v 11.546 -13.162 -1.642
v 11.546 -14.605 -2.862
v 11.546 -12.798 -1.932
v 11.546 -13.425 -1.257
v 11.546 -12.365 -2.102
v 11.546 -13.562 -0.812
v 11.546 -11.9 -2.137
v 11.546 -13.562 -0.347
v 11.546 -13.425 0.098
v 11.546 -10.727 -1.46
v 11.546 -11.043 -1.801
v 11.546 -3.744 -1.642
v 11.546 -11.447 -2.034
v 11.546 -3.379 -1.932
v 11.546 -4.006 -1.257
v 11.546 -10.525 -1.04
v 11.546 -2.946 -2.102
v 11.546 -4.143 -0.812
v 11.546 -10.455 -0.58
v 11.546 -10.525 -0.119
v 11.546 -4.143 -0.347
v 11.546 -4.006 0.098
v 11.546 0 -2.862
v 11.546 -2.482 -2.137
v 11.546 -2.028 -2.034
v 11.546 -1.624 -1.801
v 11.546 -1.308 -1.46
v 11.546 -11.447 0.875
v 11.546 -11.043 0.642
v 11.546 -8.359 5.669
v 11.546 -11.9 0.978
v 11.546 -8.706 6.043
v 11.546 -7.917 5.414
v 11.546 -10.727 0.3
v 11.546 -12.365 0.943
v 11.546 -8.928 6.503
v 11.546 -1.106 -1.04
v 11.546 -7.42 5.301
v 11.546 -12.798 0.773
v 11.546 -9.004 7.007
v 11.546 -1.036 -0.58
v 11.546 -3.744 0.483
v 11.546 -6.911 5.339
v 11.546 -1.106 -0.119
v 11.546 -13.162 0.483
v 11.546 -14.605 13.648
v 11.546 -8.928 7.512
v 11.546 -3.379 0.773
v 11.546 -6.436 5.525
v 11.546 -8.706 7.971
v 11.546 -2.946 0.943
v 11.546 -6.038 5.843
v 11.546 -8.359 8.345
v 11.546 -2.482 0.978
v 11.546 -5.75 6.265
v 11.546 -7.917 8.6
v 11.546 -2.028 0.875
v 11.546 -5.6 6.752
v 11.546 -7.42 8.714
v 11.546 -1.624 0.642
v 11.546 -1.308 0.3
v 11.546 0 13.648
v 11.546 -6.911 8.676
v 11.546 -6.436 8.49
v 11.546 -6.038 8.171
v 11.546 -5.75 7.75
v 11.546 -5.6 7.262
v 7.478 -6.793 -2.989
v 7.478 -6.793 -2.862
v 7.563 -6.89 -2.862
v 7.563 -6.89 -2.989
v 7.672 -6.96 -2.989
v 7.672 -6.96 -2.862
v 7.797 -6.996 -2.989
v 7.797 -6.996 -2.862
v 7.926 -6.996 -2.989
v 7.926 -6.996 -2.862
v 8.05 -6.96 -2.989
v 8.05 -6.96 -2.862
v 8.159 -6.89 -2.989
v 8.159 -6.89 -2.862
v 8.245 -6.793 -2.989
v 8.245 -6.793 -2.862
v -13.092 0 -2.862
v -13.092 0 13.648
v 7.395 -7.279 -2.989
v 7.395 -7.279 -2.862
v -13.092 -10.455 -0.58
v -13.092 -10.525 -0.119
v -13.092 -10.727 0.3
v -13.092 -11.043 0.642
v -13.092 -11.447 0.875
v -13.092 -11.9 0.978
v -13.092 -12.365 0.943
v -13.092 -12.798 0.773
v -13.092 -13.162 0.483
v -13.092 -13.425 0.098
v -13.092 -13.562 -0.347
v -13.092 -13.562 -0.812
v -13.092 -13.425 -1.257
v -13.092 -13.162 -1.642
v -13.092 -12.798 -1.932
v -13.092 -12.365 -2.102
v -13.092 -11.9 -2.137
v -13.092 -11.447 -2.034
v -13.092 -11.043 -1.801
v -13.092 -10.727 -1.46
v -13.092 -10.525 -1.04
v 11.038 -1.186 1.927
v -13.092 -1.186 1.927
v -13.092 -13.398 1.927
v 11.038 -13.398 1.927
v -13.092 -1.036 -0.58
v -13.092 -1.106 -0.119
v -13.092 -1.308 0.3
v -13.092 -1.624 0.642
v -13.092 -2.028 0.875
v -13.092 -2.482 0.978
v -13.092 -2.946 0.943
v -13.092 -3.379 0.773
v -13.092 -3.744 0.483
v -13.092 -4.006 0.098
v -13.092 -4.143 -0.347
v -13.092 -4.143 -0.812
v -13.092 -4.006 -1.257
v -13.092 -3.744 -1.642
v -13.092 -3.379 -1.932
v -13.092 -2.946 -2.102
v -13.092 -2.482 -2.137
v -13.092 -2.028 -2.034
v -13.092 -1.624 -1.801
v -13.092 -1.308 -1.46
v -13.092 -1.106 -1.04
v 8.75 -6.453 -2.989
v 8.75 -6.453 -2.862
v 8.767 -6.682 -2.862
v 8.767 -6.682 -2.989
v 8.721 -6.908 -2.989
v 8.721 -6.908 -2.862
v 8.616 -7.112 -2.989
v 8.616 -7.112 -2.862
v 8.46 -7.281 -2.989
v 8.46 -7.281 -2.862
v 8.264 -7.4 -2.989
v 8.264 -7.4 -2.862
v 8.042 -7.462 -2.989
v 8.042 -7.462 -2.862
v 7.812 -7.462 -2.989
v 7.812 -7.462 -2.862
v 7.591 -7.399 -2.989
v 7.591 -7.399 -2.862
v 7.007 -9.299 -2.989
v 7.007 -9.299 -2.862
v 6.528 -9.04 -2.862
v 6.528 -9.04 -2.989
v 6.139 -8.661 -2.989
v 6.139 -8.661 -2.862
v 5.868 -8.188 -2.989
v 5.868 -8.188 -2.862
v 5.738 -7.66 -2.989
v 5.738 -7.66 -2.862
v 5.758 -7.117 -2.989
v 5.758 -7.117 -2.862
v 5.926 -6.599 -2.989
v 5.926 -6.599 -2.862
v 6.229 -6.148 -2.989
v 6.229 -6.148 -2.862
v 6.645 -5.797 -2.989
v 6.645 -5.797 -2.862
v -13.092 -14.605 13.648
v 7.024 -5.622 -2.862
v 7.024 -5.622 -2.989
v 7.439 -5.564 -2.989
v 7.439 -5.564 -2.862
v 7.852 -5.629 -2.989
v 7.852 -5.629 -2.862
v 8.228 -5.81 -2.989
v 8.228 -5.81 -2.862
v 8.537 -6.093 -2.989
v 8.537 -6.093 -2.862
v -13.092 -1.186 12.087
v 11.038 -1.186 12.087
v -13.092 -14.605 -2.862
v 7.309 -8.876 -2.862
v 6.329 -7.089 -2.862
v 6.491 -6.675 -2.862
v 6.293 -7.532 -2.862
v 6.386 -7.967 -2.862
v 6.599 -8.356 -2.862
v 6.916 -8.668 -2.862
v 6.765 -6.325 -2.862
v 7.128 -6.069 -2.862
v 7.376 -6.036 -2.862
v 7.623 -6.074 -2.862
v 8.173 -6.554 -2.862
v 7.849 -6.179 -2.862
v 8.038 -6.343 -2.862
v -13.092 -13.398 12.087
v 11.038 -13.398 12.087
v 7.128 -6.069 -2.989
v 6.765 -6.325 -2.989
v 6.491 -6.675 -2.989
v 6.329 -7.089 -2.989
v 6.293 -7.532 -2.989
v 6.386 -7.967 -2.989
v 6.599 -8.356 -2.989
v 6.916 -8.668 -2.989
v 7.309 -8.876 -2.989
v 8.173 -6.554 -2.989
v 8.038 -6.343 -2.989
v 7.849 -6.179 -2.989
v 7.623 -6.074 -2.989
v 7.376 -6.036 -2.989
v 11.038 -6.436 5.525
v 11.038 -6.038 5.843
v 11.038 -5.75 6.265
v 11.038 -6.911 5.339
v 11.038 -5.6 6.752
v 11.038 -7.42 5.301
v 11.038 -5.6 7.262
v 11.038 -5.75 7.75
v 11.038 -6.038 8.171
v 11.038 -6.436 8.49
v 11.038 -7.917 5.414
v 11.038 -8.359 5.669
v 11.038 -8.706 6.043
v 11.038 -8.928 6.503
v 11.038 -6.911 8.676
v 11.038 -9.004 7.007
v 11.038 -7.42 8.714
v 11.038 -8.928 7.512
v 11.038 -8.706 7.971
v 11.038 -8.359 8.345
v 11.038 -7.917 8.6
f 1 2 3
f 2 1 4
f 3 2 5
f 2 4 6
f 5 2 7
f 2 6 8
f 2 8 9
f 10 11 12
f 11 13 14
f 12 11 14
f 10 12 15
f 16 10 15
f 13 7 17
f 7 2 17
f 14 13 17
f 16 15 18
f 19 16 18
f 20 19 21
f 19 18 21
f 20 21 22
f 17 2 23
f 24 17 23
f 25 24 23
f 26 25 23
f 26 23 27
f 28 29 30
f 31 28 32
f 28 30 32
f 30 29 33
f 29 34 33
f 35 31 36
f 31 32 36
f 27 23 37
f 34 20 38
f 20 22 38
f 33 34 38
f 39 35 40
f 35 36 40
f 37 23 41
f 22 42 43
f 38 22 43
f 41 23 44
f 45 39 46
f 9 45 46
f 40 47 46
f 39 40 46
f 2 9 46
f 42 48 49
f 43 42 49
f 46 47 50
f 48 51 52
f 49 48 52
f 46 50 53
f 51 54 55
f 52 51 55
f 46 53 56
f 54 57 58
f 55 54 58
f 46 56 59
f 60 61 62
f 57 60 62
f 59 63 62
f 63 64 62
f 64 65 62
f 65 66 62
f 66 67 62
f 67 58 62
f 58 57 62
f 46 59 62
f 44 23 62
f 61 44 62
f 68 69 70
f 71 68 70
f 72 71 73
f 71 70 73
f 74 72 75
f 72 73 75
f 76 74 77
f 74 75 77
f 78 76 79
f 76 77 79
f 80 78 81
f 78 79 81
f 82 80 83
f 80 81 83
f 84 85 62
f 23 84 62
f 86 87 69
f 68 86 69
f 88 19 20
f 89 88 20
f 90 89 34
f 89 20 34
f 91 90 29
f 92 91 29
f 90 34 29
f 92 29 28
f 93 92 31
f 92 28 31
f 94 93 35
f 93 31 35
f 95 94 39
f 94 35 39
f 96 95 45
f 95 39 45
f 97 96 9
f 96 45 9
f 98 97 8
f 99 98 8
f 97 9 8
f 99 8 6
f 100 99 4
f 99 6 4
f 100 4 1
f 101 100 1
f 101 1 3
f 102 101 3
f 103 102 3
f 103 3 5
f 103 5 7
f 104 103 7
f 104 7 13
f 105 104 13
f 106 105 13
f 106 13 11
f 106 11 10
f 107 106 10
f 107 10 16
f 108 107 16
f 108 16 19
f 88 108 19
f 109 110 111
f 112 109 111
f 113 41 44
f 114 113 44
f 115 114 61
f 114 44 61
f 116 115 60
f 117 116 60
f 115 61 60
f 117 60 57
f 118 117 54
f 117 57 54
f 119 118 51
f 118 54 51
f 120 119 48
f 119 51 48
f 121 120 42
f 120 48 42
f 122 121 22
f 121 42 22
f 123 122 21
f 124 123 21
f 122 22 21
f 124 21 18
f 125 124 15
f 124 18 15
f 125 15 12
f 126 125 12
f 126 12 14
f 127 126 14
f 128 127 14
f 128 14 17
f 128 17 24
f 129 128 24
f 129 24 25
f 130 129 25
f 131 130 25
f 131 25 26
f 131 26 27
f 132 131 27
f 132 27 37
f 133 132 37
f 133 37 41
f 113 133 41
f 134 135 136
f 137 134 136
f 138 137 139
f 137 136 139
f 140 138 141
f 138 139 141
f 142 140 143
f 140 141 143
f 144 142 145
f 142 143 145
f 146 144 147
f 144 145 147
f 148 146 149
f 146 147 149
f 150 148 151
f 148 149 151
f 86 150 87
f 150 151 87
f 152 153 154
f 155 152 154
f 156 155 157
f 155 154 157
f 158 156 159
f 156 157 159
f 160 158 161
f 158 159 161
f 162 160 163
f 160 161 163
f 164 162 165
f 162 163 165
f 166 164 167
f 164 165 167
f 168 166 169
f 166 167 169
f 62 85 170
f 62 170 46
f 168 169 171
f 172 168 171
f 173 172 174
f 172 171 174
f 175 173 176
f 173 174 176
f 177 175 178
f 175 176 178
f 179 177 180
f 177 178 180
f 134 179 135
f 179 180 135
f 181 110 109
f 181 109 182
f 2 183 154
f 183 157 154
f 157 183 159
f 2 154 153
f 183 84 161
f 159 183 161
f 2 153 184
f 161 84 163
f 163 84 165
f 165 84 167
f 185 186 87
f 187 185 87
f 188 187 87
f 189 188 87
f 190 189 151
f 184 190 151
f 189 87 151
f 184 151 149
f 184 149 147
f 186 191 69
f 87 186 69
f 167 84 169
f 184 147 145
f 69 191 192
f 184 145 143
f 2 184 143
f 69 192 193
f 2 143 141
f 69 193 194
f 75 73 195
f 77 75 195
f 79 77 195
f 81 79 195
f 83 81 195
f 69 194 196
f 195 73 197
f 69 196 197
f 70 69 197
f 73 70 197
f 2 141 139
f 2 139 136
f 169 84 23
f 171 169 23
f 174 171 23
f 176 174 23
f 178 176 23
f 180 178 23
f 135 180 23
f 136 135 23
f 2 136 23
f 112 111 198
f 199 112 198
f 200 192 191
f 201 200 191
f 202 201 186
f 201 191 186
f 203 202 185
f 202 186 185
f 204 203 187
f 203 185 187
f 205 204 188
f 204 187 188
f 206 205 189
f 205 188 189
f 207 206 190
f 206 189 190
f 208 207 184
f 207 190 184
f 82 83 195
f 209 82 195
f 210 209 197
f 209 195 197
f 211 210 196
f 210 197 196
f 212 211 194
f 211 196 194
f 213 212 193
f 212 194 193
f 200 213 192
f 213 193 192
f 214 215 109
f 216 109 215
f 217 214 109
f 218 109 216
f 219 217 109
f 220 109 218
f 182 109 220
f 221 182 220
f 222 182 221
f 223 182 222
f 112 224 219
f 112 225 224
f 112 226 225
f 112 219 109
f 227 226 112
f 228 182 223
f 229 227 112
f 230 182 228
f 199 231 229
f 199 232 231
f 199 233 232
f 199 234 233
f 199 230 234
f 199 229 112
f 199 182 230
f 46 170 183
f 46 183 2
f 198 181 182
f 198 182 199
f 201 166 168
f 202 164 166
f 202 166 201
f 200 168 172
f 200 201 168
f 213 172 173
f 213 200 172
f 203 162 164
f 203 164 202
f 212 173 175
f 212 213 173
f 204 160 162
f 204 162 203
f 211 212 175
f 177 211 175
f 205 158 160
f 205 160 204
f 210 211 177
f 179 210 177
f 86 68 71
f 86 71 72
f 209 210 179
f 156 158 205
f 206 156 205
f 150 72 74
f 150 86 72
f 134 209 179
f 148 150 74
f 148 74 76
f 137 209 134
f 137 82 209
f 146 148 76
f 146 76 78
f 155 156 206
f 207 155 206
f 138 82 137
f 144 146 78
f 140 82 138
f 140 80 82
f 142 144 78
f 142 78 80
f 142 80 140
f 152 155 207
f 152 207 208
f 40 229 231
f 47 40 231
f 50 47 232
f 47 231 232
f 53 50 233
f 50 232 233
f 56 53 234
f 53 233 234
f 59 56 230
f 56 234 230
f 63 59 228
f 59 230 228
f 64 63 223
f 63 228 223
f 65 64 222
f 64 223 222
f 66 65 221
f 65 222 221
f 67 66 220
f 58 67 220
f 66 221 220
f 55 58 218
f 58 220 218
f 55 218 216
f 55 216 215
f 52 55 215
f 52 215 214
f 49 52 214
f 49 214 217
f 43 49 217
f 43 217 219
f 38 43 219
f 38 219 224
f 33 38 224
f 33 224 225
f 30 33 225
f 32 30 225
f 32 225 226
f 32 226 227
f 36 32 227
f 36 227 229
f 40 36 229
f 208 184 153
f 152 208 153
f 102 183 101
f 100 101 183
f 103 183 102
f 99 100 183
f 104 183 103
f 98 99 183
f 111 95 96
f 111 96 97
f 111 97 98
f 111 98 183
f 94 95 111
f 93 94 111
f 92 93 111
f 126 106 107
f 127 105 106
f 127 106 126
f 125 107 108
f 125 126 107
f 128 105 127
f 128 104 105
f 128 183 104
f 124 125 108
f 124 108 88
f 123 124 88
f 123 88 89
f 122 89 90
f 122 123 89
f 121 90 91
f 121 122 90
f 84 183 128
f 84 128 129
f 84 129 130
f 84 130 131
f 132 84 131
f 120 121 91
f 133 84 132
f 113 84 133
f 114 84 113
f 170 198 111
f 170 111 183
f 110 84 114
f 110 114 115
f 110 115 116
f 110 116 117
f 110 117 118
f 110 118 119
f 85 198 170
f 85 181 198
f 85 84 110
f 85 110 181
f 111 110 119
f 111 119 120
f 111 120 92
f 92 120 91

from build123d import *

# Parameters (mm, degrees)
F0_W     = 24.638
F0_H     = 16.51
F1_DEPTH = 14.605
F2_W     = 12.211425
F2_H     = 10.16
F3_DEPTH = 24.13
F4_R     = 1.711361
F5_DEPTH = 25.4
F6_R     = 1.5621
F7_DEPTH = 25.4
F9_DEPTH = 0.127


with BuildPart() as f1:
    # F0 (on Front) → F1 (new body)
    with BuildSketch(Plane.XZ):
        with Locations((-0.772754, 5.392659)):
            Rectangle(F0_W, F0_H)
    extrude(amount=F1_DEPTH)

    # F2 (on face) → F3 (cut)
    with BuildSketch(Plane(origin=(-13.091754, 0, 0), x_dir=(0, -1, 0), z_dir=(-1, 0, 0))):
        with Locations((7.292173, 7.007426)):
            Rectangle(F2_W, F2_H)
    extrude(amount=-F3_DEPTH, mode=Mode.SUBTRACT)

    # F4 (on face) → F5 (cut)
    with BuildSketch(Plane(origin=(11.038246, 0, 0), x_dir=(0, -1, 0), z_dir=(-1, 0, 0))):
        with Locations((7.292174, 7.007426)):
            Circle(F4_R)
    extrude(amount=-F5_DEPTH, mode=Mode.SUBTRACT)

    # F6 (on face) → F7 (cut)
    with BuildSketch(Plane.YZ.offset(11.546246)):
        with Locations((-2.5984, -0.579538)):
            Circle(F6_R)
        with Locations((-12.017213, -0.579538)):
            Circle(F6_R)
    extrude(amount=-F7_DEPTH, mode=Mode.SUBTRACT)

    # F8 (on face) → F9 (join)
    with BuildSketch(Plane(origin=(0, 0, -2.862341), x_dir=(1, 0, 0), z_dir=(0, 0, -1))):
        with BuildLine():
            Line((7.308862, 8.876015), (7.006992, 9.298633))
            ThreePointArc((7.006992, 9.298633), (5.738039, 7.660322), (6.644748, 5.796942))
            ThreePointArc((6.644748, 5.796942), (7.851761, 5.628954), (8.74961, 6.45295))
            ThreePointArc((8.74961, 6.45295), (8.365962, 7.347122), (7.39537, 7.278706))
            Line((7.39537, 7.278706), (7.477945, 6.793113))
            ThreePointArc((7.477945, 6.793113), (7.861302, 7.000267), (8.244659, 6.793113))
            ThreePointArc((8.244659, 6.793113), (7.849436, 6.179211), (7.127739, 6.068625))
            ThreePointArc((7.127739, 6.068625), (6.293176, 7.532006), (7.308862, 8.876015))
        make_face()
    extrude(amount=F9_DEPTH)


solid = f1.part
